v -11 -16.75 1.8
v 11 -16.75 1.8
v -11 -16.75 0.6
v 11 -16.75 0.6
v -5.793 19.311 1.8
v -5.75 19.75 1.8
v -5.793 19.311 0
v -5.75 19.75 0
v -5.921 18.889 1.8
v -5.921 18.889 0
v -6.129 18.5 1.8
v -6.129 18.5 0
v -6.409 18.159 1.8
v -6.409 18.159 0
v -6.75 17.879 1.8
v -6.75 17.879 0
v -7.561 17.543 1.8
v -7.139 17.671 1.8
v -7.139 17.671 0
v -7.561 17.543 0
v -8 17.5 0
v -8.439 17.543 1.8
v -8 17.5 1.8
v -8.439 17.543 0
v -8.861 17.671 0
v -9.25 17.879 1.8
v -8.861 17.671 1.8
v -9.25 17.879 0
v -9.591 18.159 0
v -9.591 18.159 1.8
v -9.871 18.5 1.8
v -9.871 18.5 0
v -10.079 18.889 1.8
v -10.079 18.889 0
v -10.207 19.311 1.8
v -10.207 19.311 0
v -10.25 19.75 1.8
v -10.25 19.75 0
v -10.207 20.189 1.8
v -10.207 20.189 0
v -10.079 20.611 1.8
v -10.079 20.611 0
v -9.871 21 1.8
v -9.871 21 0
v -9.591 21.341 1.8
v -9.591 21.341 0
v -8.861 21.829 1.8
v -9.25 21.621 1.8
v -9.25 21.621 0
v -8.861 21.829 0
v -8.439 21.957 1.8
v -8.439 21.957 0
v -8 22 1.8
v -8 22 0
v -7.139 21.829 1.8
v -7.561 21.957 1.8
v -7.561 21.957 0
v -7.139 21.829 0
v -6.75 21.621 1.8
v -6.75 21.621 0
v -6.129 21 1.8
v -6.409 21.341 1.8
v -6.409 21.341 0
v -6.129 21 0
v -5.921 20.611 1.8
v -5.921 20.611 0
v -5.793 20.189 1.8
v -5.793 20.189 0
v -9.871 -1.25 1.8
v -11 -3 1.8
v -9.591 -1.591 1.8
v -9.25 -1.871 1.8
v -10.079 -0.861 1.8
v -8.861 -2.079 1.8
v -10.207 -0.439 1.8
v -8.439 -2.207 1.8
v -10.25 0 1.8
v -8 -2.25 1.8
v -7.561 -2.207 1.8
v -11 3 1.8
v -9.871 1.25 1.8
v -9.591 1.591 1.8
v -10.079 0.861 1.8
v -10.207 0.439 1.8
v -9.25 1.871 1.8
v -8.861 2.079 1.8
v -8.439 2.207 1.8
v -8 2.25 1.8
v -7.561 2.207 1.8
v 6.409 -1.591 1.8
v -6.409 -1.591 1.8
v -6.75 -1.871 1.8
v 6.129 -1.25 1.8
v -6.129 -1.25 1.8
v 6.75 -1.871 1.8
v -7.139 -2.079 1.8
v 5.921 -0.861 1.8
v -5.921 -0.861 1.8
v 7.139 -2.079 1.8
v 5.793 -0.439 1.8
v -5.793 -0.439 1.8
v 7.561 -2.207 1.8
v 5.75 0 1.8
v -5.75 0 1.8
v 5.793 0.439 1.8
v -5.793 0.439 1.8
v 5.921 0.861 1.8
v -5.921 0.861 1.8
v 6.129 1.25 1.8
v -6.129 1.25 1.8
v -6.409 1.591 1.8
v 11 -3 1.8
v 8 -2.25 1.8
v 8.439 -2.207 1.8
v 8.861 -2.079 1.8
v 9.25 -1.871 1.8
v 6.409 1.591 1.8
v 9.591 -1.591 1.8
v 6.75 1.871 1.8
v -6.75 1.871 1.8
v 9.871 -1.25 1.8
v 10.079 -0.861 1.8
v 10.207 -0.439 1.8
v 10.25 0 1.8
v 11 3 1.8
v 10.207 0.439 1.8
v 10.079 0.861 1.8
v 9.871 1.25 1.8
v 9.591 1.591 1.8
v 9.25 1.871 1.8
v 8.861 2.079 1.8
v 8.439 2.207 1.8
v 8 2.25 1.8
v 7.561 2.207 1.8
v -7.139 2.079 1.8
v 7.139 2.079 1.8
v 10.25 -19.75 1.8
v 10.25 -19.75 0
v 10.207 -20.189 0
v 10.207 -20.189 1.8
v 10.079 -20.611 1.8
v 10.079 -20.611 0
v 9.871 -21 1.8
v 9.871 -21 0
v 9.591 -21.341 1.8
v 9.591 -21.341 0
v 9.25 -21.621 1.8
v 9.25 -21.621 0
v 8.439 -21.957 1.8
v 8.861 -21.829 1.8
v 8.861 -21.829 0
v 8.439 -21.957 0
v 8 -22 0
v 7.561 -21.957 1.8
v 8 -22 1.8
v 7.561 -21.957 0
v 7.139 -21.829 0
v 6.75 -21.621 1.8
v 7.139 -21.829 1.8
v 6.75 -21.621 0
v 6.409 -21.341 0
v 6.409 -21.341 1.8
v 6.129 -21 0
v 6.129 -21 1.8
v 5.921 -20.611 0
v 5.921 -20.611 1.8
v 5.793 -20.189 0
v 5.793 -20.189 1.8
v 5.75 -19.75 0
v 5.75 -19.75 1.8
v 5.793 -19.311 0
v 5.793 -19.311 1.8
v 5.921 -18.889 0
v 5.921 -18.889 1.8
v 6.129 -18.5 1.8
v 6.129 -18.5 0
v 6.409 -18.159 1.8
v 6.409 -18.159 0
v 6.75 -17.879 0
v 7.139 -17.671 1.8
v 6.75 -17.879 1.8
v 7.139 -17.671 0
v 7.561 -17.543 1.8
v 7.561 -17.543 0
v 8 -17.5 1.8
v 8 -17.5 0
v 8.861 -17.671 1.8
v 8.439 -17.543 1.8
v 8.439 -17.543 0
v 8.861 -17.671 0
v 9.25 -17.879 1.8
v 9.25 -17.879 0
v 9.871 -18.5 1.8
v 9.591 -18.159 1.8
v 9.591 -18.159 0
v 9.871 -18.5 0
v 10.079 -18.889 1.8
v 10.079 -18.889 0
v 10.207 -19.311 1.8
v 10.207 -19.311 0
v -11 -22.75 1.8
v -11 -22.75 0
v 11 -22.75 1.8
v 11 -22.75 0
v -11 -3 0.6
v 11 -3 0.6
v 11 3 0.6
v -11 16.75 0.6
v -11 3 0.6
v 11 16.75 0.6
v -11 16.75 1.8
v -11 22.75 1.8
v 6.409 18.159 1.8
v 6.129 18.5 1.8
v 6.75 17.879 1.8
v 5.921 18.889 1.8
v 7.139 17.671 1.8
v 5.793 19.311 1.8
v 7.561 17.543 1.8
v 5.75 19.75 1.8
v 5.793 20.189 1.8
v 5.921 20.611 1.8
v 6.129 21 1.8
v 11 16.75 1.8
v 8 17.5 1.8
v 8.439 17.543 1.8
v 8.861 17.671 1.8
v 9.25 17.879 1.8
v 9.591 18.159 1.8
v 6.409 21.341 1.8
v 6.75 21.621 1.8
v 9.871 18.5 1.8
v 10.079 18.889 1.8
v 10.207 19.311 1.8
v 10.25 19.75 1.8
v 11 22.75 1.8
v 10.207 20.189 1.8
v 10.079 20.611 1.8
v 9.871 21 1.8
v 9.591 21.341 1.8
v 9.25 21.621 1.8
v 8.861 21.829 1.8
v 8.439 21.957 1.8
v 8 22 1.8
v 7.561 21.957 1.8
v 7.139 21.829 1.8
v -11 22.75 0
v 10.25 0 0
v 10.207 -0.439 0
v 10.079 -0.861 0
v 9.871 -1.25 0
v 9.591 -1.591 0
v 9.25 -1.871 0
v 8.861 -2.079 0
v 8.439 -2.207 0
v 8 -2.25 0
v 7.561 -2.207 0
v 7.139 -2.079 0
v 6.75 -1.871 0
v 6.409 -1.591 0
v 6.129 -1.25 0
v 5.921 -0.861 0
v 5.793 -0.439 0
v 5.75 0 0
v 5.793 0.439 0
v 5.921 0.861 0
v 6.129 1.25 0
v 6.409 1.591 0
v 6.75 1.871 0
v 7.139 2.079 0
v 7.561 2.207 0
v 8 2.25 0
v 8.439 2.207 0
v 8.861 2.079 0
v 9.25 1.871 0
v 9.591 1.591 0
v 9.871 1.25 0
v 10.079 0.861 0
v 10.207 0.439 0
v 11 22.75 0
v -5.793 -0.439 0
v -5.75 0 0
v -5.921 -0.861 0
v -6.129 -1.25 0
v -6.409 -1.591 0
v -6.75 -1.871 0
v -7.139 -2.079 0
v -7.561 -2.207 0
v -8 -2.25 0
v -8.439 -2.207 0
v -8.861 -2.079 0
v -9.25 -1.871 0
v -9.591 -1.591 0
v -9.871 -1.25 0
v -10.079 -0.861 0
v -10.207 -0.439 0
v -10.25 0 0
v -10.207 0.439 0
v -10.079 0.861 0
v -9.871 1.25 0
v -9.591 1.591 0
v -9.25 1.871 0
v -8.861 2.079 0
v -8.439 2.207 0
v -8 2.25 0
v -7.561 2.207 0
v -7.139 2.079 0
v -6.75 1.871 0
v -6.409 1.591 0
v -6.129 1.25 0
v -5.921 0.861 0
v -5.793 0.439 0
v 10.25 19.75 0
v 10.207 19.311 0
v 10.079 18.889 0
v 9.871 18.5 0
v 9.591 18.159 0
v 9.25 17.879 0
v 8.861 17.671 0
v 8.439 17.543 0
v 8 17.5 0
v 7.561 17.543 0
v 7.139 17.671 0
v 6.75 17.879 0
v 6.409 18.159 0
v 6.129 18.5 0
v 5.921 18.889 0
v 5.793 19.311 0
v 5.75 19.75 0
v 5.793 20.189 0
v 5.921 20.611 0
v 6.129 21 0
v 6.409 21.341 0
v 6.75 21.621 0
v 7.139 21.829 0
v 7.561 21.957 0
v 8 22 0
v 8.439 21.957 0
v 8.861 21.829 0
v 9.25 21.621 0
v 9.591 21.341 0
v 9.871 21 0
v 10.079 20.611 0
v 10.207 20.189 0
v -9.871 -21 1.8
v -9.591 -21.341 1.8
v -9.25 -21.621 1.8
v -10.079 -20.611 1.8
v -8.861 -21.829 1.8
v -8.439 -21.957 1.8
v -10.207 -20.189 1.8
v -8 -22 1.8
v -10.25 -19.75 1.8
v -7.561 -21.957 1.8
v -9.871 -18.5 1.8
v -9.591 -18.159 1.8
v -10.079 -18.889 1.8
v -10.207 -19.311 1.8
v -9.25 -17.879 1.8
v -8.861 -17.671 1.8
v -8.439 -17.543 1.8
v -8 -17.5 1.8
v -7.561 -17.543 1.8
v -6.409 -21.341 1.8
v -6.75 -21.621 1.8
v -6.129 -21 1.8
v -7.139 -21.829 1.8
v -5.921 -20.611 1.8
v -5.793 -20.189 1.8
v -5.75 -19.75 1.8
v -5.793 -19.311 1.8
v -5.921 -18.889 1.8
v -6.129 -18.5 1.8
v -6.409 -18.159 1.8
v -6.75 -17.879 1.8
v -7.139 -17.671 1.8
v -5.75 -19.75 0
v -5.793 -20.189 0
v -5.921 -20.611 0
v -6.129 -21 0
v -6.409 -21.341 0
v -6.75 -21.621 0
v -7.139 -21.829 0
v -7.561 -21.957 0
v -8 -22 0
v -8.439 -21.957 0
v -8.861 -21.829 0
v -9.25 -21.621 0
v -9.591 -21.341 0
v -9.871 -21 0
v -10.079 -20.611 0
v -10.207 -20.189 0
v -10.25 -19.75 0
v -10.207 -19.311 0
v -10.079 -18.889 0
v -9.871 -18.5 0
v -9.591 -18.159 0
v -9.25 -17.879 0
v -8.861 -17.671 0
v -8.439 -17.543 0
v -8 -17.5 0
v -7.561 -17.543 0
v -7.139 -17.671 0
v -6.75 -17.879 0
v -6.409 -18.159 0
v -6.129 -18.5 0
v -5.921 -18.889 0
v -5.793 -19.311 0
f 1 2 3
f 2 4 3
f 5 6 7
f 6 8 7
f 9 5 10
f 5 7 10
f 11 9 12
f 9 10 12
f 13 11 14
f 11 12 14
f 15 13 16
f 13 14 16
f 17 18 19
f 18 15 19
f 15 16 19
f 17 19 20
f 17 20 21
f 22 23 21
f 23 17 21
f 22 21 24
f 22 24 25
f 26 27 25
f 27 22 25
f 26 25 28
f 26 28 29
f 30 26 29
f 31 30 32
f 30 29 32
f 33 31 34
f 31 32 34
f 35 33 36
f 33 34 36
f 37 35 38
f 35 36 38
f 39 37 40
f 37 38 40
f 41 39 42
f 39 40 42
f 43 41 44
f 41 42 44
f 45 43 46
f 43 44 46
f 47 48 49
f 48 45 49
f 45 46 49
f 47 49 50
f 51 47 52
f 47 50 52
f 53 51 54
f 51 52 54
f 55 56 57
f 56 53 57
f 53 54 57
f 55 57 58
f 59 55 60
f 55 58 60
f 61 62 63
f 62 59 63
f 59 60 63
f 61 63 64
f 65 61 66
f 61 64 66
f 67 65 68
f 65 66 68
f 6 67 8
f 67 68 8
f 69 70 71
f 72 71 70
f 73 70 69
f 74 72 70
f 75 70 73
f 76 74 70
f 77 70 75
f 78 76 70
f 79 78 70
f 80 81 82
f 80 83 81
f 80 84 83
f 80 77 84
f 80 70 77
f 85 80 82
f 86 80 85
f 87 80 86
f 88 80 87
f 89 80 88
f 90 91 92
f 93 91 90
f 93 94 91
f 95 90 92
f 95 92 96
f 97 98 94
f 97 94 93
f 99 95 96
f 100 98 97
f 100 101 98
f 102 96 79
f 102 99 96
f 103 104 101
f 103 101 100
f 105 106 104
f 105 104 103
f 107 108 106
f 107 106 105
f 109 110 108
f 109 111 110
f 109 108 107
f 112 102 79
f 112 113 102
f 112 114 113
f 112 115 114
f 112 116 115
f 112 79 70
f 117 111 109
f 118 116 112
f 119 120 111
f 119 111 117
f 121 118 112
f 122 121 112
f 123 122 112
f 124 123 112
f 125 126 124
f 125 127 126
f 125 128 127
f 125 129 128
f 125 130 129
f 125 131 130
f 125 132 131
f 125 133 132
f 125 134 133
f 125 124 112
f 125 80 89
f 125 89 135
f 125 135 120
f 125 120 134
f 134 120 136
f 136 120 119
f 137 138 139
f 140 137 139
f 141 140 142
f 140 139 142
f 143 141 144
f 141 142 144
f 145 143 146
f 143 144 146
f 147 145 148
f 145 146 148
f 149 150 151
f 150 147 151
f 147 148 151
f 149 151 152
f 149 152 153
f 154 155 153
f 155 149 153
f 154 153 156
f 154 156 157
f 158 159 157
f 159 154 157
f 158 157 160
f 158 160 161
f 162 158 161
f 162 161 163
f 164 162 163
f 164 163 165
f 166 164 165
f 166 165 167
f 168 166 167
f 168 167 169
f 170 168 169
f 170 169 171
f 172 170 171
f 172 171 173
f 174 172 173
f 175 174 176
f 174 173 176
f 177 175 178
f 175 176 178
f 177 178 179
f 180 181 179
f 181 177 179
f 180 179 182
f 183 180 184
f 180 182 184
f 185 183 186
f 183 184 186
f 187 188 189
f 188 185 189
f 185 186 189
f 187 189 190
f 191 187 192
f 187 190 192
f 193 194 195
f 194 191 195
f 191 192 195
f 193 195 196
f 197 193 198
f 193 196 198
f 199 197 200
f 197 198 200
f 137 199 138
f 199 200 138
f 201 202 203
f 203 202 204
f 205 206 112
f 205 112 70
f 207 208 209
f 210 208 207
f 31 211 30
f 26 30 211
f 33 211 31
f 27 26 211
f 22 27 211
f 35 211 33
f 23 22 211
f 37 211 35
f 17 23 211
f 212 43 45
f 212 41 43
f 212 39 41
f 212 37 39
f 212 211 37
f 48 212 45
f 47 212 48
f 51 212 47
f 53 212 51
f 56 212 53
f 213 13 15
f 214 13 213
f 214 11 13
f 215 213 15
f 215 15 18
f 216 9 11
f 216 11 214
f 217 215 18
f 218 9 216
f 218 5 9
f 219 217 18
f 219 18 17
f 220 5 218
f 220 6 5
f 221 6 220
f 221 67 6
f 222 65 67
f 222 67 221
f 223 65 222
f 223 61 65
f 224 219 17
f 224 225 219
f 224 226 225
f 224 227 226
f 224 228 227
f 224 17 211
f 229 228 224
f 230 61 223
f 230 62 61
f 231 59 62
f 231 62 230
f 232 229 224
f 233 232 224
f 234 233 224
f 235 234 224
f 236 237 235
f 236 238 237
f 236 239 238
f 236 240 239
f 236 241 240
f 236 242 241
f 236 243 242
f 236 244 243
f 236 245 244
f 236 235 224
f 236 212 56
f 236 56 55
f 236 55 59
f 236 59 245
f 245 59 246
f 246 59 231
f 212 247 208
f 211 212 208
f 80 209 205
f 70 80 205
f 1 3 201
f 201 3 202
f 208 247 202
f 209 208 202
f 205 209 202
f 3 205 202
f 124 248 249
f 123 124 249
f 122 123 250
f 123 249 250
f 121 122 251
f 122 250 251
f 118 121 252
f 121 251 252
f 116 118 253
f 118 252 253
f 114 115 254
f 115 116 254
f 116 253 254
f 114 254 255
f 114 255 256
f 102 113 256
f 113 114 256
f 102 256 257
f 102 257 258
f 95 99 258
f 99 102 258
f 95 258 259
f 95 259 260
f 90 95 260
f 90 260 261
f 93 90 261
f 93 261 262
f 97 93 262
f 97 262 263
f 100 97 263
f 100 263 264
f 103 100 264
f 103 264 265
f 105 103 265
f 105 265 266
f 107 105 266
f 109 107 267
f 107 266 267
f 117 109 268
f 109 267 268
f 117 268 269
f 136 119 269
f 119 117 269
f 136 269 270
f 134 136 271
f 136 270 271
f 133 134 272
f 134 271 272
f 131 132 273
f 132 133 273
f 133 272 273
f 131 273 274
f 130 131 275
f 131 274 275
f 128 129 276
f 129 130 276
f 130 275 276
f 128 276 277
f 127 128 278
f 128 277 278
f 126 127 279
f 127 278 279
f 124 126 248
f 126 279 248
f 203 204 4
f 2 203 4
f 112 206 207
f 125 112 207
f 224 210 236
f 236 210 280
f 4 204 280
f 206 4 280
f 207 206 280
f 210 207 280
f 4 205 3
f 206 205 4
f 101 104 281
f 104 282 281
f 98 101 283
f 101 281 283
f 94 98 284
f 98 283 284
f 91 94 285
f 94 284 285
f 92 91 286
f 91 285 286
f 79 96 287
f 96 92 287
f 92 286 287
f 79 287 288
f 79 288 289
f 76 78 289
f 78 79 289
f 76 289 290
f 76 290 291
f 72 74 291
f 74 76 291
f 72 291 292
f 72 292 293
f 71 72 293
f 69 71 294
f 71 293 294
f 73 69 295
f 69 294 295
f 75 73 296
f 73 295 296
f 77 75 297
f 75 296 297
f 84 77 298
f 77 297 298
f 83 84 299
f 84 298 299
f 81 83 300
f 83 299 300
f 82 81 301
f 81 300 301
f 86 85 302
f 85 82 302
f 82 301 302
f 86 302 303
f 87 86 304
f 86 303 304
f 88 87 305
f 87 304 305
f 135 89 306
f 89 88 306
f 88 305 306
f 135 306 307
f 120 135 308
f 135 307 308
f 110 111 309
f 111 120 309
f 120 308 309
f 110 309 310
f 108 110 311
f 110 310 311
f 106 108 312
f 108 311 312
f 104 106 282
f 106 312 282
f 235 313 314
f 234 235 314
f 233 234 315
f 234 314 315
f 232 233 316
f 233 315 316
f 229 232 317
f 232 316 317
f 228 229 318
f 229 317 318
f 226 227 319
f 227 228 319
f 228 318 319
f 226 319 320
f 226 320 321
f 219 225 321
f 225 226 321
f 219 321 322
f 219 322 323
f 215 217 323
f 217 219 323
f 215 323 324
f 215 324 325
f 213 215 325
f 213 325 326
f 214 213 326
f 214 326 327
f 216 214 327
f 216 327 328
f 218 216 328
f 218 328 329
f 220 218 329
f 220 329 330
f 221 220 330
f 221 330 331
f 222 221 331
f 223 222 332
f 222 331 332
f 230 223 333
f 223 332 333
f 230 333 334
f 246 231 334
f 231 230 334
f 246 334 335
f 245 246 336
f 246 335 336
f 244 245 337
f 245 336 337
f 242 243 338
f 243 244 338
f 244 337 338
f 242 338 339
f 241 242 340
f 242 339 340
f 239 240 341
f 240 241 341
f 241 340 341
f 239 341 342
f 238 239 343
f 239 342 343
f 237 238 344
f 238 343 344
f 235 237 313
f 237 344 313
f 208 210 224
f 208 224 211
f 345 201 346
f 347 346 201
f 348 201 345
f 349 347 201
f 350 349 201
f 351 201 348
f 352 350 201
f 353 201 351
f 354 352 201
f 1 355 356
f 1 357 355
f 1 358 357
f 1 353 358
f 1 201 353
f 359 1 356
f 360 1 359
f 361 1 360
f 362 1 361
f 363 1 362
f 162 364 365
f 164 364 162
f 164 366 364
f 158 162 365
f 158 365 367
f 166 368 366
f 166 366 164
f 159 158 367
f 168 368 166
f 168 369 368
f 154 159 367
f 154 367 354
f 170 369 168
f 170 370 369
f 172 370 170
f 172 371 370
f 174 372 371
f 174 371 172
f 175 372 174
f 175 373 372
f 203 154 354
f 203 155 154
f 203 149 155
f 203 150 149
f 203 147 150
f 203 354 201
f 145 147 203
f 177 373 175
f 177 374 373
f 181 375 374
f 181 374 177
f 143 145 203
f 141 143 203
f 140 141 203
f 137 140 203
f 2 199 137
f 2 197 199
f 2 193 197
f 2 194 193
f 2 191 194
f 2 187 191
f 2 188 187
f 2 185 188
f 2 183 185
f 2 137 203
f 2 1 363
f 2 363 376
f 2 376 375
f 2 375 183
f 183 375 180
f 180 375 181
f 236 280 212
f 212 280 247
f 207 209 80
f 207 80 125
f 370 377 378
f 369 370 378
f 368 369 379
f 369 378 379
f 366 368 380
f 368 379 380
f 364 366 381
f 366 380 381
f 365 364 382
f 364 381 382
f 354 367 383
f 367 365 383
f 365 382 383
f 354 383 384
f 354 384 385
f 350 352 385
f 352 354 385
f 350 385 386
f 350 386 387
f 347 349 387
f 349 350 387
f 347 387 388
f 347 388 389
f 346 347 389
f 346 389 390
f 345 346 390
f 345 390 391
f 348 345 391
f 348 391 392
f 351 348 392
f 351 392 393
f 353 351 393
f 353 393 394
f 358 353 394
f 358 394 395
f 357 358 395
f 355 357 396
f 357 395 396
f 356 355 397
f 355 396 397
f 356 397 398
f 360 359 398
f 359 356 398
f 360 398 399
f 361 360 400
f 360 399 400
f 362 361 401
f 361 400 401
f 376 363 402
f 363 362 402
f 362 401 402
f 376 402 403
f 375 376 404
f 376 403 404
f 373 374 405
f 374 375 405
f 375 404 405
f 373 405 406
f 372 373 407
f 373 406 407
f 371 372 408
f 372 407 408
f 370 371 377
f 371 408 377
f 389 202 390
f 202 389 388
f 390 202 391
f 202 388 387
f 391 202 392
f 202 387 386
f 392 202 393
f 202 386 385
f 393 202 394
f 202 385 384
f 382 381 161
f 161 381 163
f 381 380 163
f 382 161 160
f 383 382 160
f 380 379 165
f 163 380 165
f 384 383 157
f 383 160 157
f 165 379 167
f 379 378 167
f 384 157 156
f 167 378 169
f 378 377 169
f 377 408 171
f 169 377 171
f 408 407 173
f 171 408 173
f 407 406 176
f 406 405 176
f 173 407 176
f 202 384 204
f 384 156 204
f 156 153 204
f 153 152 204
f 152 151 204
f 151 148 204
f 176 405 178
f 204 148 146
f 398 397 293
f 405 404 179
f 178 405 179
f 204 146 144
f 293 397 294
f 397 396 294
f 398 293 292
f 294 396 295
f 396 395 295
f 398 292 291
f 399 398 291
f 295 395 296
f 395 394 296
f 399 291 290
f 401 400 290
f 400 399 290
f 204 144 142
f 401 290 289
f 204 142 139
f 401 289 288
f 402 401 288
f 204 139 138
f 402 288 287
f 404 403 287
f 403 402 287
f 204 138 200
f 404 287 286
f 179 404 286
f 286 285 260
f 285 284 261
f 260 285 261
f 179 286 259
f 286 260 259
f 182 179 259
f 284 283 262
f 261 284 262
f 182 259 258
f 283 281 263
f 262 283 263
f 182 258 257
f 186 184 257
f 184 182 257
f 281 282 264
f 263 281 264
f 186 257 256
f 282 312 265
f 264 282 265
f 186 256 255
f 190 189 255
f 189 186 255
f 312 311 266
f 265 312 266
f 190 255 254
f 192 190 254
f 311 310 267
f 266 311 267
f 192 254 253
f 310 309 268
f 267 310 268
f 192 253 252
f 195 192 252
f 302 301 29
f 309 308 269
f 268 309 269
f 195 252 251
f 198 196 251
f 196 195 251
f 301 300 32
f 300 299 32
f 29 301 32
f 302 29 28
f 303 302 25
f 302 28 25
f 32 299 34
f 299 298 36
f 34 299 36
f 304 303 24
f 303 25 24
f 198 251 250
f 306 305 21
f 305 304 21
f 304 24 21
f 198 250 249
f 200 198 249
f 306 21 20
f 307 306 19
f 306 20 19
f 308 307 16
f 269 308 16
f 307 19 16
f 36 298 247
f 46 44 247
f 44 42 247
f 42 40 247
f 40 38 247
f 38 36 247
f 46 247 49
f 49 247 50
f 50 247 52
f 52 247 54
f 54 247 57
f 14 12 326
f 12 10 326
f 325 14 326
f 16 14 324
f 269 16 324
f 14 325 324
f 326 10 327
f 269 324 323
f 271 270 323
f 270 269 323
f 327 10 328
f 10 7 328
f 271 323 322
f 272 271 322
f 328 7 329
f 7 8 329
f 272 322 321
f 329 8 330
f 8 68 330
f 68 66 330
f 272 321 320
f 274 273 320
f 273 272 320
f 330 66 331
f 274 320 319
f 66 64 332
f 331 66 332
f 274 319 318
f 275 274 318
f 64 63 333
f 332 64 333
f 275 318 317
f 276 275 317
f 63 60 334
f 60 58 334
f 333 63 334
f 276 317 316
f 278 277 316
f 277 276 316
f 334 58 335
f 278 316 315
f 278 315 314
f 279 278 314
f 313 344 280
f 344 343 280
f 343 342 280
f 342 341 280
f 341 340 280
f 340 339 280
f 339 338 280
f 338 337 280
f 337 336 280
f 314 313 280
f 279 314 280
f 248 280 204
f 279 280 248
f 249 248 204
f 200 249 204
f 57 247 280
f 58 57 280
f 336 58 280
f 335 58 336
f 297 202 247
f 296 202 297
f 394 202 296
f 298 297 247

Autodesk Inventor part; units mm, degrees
ref_plane "YZ Plane" through (0, 0, 0) normal (1, 0, 0) x (0, 1, 0)
ref_plane "XZ Plane" through (0, 0, 0) normal (0, 1, 0) x (-1, 0, 0)
ref_plane "XY Plane" through (0, 0, 0) normal (0, 0, 1) x (1, 0, 0)
sketch "Sketch1" plane through (0, 0, 0) normal (0, 0, 1) x (1, 0, 0)
  line L0 (-11, -22.75) -> (11, -22.75)
  line L1 (11, -22.75) -> (11, 22.75)
  line L2 (11, 22.75) -> (-11, 22.75)
  line L3 (-11, 22.75) -> (-11, -22.75)
  circle A0 centre (-8, 0) radius 2.25
  line L4 (-5, 22.75) -> (-5, -22.75) construction
  line L5 (5, 22.75) -> (5, -22.75) construction
  line L6 (0, 22.75) -> (0, -22.75) construction
  circle A1 centre (-8, 19.75) radius 2.25
  circle A2 centre (-8, -19.75) radius 2.25
  circle A3 centre (8, -19.75) radius 2.25
  circle A4 centre (8, 0) radius 2.25
  circle A5 centre (8, 19.75) radius 2.25
  line L7 (-11, 0) -> (11, 0) construction
  line L8 (-11, 22.75) -> (11, 22.75)
  line L9 (11, 22.75) -> (11, 16.75)
  line L10 (11, 16.75) -> (-11, 16.75)
  line L11 (-11, 16.75) -> (-11, 22.75)
  line L12 (-11, 3) -> (11, 3)
  line L13 (11, 3) -> (11, -3)
  line L14 (11, -3) -> (-11, -3)
  line L15 (-11, -3) -> (-11, 3)
  line L16 (-11, -22.75) -> (11, -22.75)
  line L17 (11, -22.75) -> (11, -16.75)
  line L18 (11, -16.75) -> (-11, -16.75)
  line L19 (-11, -16.75) -> (-11, -22.75)
  point P0 (0, 0)
  dimension "d0" = 4.5
  dimension "d1" = 3
  dimension "d2" = 3
  dimension "d3" = 10
  dimension "d5" = 4.5
  dimension "d6" = 3
  dimension "d7" = 3
  dimension "d8" = 4.5
  dimension "d9" = 3
  dimension "d10" = 3
  dimension "d11" = 3
  dimension "d14" = 22
  dimension "d15" = 3
  dimension "d16" = 3
  dimension "d17" = 3
  dimension "d18" = 3
extrude "Extrusion1" add sketch "Sketch1" along normal blind 0.6
extrude "Extrusion2" add sketch "Sketch1" along normal blind 1.8 contours L3 L18 L1 L0 | L3 L12 L1 L14 | L3 L2 L1 L10
properties part number "FoldLink" material "Rubber, Silicone"
